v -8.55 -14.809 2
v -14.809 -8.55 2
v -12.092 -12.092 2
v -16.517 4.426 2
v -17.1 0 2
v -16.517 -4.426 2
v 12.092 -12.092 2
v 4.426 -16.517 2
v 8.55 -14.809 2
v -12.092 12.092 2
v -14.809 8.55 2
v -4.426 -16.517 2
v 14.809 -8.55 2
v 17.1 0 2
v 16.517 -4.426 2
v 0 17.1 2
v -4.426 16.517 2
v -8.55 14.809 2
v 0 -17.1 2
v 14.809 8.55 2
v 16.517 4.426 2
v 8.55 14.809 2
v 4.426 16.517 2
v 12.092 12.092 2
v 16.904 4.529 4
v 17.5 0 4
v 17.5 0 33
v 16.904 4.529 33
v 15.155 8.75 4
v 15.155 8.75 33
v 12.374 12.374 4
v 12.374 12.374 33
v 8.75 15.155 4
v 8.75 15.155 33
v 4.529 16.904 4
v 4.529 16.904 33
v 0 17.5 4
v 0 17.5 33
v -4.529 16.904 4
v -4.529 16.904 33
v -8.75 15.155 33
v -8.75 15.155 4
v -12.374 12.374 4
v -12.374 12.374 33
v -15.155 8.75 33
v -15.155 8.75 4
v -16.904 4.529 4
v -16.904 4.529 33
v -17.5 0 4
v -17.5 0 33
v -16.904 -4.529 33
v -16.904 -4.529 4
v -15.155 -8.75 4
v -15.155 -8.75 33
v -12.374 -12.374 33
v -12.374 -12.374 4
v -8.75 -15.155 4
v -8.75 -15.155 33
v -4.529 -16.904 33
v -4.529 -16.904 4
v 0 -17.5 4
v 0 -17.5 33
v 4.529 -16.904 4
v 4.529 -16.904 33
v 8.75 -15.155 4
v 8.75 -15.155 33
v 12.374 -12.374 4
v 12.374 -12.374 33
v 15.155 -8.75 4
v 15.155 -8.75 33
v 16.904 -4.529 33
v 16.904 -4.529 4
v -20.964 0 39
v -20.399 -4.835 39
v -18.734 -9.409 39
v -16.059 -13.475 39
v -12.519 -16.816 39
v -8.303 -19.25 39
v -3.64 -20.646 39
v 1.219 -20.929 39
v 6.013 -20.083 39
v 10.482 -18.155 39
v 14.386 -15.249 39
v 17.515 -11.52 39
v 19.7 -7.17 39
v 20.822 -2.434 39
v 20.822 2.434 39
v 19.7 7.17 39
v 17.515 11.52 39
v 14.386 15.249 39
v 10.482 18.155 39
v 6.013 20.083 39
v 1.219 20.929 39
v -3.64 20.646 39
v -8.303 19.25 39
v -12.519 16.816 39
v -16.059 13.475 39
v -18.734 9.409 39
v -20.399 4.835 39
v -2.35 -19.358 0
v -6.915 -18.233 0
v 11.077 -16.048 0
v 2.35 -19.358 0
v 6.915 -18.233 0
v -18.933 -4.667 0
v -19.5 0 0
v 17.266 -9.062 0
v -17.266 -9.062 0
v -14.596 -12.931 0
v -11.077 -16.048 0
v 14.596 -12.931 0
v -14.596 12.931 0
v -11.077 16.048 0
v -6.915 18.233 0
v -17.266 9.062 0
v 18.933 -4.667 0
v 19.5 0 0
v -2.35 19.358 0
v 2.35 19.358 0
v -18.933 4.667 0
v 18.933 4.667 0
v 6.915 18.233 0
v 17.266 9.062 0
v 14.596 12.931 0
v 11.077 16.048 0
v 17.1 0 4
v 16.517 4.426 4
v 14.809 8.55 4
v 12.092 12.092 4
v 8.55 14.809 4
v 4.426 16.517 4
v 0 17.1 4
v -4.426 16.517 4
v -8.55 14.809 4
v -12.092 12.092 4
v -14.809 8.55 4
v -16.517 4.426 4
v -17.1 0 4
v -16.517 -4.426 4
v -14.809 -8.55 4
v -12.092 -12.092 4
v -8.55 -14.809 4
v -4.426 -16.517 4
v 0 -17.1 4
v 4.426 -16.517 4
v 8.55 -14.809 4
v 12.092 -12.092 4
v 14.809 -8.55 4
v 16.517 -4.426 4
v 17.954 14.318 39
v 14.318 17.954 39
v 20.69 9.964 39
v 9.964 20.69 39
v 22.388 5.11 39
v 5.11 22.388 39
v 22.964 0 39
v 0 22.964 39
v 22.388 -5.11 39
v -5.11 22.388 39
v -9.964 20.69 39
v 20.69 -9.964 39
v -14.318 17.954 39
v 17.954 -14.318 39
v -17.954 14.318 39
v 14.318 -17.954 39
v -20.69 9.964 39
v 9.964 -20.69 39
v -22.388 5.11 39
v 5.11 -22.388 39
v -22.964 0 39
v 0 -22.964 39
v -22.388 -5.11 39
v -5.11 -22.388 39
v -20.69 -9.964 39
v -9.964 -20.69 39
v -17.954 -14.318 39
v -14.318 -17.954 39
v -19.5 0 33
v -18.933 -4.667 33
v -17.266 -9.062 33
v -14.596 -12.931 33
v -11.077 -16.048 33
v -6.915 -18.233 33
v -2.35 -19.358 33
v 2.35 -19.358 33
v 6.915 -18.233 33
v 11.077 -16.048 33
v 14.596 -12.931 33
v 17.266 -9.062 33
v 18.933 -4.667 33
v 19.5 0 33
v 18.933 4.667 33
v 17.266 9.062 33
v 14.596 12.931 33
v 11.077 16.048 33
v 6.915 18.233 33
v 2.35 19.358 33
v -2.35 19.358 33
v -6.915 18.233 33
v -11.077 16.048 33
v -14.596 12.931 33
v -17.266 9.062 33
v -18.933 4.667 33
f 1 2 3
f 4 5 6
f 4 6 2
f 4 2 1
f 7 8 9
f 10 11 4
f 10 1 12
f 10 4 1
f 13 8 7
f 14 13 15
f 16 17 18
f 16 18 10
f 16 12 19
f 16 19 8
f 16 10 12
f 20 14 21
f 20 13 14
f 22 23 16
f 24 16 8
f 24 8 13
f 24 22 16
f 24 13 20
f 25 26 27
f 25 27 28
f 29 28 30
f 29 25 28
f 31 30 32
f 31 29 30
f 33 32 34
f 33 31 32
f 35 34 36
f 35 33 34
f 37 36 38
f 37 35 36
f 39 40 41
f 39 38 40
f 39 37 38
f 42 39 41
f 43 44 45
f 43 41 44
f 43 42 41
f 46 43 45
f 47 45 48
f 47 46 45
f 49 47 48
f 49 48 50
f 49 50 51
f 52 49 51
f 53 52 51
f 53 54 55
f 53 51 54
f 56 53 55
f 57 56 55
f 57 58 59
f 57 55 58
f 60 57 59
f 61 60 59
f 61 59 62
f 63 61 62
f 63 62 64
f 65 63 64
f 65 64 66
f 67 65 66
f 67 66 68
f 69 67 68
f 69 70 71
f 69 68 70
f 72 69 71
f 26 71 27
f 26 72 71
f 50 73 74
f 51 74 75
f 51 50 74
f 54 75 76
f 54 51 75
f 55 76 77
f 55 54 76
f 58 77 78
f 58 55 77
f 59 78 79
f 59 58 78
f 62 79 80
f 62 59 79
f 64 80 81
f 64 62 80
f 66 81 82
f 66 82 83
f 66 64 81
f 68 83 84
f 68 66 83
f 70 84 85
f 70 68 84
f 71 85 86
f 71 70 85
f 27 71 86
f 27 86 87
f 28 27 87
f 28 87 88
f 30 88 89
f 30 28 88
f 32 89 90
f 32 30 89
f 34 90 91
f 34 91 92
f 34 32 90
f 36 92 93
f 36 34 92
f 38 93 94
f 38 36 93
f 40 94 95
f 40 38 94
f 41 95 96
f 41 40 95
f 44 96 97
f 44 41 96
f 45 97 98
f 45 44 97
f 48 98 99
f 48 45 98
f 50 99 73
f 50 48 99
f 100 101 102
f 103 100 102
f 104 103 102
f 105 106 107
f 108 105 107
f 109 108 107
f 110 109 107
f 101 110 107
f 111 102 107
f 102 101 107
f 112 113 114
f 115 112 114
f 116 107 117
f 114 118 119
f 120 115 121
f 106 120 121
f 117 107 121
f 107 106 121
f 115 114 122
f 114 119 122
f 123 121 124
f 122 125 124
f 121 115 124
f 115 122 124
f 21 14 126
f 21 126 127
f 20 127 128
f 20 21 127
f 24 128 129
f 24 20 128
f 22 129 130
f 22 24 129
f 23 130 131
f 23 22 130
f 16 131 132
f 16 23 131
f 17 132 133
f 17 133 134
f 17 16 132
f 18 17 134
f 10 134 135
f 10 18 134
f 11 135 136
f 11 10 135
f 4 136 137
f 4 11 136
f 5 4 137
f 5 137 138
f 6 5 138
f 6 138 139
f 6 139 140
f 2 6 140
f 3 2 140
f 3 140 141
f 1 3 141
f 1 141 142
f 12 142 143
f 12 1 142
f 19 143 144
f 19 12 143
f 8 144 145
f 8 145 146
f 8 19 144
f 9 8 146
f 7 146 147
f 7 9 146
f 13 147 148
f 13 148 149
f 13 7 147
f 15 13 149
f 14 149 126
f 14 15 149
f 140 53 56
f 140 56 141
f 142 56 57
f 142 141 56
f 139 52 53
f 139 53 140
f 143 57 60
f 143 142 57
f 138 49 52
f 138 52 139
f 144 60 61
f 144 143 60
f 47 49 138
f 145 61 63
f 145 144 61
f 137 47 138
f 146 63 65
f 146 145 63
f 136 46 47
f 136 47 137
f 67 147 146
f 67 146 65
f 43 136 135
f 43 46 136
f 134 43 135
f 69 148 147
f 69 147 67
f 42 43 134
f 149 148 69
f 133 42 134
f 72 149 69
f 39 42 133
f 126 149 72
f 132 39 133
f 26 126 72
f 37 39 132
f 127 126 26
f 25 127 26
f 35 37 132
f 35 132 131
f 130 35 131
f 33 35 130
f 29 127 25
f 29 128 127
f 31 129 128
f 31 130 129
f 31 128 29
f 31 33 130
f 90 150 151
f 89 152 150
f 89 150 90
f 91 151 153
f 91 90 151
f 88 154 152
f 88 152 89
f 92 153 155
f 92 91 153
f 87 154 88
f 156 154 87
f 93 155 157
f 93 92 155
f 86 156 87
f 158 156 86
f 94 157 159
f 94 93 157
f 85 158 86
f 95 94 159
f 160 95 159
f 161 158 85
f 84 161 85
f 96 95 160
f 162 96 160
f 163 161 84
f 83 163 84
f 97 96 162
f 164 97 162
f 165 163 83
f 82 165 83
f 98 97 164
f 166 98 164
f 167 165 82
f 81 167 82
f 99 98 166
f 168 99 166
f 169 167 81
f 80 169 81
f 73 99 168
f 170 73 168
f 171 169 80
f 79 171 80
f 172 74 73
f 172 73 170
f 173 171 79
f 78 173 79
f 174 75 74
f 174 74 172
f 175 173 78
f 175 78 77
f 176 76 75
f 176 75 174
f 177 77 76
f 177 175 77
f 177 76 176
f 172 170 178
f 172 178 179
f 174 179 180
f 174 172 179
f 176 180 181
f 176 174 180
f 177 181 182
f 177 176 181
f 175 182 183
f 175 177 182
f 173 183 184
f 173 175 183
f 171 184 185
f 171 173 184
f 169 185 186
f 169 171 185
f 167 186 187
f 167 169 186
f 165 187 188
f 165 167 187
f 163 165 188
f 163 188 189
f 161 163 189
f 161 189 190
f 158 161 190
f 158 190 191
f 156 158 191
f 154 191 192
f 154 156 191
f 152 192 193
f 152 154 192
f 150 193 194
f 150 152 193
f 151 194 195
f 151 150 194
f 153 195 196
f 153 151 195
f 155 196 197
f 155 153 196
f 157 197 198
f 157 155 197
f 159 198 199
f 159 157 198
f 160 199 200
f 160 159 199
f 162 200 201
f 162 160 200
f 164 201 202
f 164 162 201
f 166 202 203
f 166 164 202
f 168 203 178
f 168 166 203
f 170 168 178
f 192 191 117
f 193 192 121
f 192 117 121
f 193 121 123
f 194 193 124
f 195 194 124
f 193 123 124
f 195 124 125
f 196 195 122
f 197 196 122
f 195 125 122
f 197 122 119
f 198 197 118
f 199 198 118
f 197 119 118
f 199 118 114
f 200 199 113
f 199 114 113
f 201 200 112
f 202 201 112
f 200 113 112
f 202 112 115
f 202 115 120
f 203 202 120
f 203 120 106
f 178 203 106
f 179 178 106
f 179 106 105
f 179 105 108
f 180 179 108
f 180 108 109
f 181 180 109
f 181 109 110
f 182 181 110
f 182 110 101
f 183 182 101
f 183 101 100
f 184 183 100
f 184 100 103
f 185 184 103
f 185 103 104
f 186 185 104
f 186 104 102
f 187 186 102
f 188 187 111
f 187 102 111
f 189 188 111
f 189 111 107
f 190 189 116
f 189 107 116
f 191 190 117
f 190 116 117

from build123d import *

# Parameters (mm, degrees)
SKETCH1_R           = 19.5
BOSS_EXTRUDE1_DEPTH = 37
SHELL1_T            = -2
SKETCH2_R           = 17.5
SKETCH2_R_2         = 17.1
BOSS_EXTRUDE2_DEPTH = 2
CUT_EXTRUDE1_START  = -4
SKETCH3_R           = 19.5
CUT_EXTRUDE1_DEPTH  = 4


with BuildPart() as part:
    # Sketch1 → Boss-Extrude1 (new body)
    with BuildSketch(Plane.XY):
        Circle(SKETCH1_R)
    extrude(amount=BOSS_EXTRUDE1_DEPTH)

    # Shell1
    shell1_openings = [part.faces().sort_by_distance(p)[0] for p in [
        (0, 0, 37),
    ]]
    offset(amount=SHELL1_T, openings=shell1_openings, kind=Kind.INTERSECTION)

    # Sketch2 → Boss-Extrude2 (add)
    with BuildSketch(Plane.XY.offset(2)):
        Circle(SKETCH2_R)
        Circle(SKETCH2_R_2, mode=Mode.SUBTRACT)
    extrude(amount=BOSS_EXTRUDE2_DEPTH)

    # Sketch3 → Cut-Extrude1 (cut)
    with BuildSketch(Plane.XY.offset(37).offset(CUT_EXTRUDE1_START)):
        Circle(SKETCH3_R)
    extrude(amount=CUT_EXTRUDE1_DEPTH, mode=Mode.SUBTRACT)

    # Sketch4 → Revolve1 (revolve)
    with BuildSketch(Plane(origin=(0, 0, 0), x_dir=(1, 0, 0), z_dir=(0, 1, 0)), mode=Mode.PRIVATE) as revolve1_sk:
        Polygon((19.5, -33), (22.964101615, -39), (20.964101615, -39), (17.5, -33), align=None)
    revolve(revolve1_sk.sketch.rotate(Axis((0, 0, 33), (0, 0, 1)), 180), axis=Axis((0, 0, 33), (0, 0, 1)))


solid = part.part
